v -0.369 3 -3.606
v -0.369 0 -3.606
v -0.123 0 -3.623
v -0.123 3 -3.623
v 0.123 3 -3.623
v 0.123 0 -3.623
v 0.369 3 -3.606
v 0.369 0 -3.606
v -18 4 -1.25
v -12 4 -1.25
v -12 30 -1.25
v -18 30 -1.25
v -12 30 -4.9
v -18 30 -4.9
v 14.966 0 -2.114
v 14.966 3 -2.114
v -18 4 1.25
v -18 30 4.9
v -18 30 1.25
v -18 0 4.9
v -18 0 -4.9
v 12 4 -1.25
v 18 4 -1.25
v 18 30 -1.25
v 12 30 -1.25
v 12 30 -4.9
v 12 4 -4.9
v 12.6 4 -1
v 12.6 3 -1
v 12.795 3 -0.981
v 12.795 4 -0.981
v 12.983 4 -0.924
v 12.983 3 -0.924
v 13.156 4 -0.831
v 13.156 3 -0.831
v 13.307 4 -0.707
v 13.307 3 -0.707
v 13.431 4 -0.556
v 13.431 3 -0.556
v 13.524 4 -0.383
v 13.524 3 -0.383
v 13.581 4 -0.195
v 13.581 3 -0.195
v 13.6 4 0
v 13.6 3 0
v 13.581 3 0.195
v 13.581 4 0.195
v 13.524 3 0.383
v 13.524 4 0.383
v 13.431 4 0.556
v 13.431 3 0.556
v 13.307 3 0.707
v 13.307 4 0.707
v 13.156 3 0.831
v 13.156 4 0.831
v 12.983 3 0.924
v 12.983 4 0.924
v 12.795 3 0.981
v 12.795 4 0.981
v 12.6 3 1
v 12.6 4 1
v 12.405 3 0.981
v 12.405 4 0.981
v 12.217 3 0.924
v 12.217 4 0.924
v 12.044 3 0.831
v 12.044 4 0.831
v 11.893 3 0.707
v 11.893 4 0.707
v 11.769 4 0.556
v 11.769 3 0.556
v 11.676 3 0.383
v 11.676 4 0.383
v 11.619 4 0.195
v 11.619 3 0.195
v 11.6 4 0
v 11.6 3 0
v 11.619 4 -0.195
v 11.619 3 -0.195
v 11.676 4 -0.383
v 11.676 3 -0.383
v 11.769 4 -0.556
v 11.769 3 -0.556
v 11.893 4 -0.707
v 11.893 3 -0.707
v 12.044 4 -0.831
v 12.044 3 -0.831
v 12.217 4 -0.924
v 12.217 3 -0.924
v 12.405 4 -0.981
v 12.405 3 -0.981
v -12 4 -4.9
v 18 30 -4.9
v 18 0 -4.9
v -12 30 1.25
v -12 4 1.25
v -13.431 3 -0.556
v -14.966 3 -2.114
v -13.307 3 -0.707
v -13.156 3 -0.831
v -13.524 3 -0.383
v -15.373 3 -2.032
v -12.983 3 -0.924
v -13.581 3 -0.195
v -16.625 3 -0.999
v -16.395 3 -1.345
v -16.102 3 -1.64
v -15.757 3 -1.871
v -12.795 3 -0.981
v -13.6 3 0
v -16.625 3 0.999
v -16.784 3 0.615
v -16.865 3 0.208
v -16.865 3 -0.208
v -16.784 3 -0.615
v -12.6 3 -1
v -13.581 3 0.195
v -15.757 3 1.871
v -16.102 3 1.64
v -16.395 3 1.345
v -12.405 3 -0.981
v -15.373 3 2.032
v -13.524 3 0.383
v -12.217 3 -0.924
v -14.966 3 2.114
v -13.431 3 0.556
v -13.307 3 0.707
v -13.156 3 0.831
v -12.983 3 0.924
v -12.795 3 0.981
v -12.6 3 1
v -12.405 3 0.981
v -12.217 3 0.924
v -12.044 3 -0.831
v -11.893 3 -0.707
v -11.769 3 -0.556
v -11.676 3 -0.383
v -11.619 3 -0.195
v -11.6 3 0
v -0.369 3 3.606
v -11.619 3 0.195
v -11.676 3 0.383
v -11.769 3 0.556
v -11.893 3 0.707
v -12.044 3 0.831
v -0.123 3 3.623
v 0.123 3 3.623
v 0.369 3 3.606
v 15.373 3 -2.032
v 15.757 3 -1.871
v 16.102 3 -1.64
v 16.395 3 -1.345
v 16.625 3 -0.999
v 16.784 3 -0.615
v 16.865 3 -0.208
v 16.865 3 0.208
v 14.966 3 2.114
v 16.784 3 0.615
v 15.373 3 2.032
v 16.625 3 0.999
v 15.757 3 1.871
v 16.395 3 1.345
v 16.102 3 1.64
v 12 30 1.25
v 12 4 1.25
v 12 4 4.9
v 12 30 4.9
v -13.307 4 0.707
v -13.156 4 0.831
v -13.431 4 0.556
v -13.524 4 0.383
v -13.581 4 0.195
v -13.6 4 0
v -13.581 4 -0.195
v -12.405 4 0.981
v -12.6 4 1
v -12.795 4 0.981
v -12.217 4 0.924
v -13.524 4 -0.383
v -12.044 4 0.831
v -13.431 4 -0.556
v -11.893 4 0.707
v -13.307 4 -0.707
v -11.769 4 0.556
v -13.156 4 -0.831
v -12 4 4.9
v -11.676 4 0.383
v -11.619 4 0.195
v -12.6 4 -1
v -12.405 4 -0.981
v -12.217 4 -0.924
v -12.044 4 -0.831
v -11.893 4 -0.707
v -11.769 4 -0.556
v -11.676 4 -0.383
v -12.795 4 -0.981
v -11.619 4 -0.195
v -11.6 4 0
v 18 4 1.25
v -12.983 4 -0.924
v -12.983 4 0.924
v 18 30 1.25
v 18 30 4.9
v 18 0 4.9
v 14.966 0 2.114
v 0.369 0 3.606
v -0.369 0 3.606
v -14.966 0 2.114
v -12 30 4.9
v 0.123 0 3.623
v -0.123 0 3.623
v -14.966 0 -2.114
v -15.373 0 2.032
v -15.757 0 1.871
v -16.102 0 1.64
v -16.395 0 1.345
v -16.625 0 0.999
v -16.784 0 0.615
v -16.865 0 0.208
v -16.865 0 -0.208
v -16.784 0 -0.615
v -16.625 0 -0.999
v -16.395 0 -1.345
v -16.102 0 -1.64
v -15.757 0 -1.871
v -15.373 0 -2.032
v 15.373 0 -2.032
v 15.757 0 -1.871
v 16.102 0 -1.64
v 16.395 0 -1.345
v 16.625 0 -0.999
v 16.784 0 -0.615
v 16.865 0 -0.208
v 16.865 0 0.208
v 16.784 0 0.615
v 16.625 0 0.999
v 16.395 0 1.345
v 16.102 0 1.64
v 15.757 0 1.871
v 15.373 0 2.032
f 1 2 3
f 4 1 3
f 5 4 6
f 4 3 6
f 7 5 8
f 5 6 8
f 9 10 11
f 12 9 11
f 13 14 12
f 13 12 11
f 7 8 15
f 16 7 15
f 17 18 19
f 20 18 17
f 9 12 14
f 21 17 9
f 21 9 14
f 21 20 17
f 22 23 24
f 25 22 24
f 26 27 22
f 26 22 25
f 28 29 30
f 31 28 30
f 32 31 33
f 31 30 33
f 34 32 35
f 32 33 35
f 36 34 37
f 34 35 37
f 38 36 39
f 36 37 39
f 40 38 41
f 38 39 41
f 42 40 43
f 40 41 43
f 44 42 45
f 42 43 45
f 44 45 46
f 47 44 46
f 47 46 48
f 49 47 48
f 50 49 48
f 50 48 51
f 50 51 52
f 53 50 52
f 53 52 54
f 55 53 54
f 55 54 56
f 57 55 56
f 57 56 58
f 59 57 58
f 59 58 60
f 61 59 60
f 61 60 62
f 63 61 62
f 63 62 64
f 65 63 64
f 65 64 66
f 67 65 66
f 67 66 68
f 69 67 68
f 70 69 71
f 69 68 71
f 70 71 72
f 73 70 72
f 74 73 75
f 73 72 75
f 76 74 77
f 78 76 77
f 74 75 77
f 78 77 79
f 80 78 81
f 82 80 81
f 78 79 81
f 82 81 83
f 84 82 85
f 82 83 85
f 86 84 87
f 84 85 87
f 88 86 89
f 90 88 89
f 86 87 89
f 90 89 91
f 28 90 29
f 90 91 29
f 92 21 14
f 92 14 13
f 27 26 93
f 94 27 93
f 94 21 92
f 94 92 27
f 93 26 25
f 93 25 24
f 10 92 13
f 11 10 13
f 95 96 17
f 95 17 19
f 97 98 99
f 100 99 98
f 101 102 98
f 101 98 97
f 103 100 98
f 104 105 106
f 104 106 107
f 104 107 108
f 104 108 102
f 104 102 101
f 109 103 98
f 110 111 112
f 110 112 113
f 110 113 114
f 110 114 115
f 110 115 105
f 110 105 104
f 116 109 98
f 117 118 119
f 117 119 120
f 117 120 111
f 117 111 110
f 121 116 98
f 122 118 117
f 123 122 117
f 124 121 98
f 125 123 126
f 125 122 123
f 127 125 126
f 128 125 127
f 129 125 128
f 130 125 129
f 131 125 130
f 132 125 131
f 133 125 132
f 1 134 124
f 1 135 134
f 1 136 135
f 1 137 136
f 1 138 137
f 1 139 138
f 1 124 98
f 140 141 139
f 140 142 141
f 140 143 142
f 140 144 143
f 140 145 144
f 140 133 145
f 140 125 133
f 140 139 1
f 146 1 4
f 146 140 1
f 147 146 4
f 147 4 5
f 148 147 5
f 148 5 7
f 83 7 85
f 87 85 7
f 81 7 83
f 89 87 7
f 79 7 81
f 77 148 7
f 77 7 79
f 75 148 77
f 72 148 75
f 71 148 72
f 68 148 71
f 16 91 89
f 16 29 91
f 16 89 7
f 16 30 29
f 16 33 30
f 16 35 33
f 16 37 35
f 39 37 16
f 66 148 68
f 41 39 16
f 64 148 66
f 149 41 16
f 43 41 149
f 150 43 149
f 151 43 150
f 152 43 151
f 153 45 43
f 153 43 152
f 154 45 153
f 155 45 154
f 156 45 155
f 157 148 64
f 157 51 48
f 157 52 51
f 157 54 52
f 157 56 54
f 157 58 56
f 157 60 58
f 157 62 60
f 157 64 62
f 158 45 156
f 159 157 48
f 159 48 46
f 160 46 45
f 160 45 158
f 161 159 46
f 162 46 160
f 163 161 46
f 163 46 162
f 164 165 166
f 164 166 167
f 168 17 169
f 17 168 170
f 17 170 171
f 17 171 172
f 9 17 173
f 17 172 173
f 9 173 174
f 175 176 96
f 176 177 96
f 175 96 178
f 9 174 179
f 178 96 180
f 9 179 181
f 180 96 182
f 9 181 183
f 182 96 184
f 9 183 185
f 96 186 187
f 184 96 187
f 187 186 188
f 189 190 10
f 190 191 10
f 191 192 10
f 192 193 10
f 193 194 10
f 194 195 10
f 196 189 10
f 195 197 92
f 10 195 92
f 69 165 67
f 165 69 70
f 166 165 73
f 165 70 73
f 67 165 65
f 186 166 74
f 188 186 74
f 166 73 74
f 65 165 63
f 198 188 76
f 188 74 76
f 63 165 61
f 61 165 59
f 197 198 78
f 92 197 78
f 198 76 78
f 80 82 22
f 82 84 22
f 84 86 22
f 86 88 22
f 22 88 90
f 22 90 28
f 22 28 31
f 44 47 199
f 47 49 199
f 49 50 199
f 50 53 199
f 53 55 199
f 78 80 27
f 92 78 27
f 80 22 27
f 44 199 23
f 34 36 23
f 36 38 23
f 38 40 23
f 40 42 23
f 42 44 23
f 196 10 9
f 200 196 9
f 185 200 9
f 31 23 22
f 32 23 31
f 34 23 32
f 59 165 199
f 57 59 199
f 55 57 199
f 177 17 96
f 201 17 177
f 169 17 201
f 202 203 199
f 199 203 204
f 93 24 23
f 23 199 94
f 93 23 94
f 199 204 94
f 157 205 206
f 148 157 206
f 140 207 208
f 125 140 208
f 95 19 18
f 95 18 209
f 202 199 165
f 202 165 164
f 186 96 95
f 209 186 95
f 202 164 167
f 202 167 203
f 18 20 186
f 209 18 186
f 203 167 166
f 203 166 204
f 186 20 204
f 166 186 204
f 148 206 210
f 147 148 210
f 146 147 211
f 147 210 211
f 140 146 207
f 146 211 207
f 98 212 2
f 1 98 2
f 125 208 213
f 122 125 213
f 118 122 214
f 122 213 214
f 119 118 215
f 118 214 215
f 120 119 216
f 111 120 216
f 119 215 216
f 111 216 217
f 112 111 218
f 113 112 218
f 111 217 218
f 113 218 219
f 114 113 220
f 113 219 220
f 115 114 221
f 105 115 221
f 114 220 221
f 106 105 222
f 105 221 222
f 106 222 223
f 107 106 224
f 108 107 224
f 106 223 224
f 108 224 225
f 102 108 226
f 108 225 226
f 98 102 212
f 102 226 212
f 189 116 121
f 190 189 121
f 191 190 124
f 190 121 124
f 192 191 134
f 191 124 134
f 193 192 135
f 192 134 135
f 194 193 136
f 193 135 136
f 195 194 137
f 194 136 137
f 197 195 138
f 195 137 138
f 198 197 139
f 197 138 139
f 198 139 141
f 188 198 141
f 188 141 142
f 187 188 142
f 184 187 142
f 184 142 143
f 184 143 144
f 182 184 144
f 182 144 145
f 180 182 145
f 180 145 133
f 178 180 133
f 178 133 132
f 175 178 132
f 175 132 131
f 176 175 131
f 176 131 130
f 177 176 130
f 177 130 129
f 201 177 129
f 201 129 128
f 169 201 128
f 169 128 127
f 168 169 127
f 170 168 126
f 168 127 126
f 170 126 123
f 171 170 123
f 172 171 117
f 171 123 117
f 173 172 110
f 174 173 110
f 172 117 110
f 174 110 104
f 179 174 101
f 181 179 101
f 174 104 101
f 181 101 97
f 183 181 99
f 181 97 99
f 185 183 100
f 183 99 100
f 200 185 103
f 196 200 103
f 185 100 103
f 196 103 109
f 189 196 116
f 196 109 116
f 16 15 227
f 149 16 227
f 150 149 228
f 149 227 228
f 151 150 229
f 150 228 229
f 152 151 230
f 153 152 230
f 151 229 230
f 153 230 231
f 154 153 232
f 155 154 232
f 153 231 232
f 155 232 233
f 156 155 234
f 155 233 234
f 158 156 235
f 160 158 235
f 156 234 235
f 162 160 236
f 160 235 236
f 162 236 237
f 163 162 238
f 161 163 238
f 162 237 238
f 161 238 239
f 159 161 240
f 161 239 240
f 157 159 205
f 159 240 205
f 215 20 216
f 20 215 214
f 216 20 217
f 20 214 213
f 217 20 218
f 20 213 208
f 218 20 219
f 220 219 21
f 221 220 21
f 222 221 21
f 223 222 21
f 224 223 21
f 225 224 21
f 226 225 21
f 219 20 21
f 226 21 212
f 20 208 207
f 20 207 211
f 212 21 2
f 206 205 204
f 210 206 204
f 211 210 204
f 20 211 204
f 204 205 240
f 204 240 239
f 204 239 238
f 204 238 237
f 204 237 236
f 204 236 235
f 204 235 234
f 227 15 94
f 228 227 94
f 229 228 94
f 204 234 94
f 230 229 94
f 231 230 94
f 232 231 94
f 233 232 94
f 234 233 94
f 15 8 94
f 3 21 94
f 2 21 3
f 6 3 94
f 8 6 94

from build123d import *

# Parameters (mm, degrees)
SKETCH_1_W          = 36
SKETCH_1_H          = 9.8
EXTRUDE_1_DEPTH     = 30
SKETCH_2_W          = 2.5
SKETCH_2_H          = 26
CUT_EXTRUDE_1_DEPTH = 48.116982077
SKETCH_3_W          = 24
SKETCH_3_H          = 26
CUT_EXTRUDE_2_DEPTH = 37.332354727
CUT_EXTRUDE_3_DEPTH = 3
CUT_EXTRUDE_4_REACH = 34.818
SKETCH_9_R          = 1


with BuildPart() as part:
    # 草图1 → 凸台-拉伸1 (new body)
    with BuildSketch(Plane(origin=(0, 0, 0), x_dir=(1, 0, 0), z_dir=(0, 1, 0))):
        Rectangle(SKETCH_1_W, SKETCH_1_H)
    extrude(amount=EXTRUDE_1_DEPTH)

    # 草图2 → 切除-拉伸1 (cut, through all)
    with BuildSketch(Plane(origin=(18, 0, 0), x_dir=(0, 0, -1), z_dir=(1, 0, 0))):
        with Locations((0, 17)):
            Rectangle(SKETCH_2_W, SKETCH_2_H)
    extrude(amount=-CUT_EXTRUDE_1_DEPTH, mode=Mode.SUBTRACT)

    # 草图3 → 切除-拉伸2 (cut, through all)
    with BuildSketch(Plane(origin=(0, 0, -4.9), x_dir=(-1, 0, 0), z_dir=(0, 0, -1))):
        with Locations((0, 17)):
            Rectangle(SKETCH_3_W, SKETCH_3_H)
    extrude(amount=-CUT_EXTRUDE_2_DEPTH, mode=Mode.SUBTRACT)

    # 草图5 → 切除-拉伸3 (cut)
    with BuildSketch(Plane.XZ):
        with BuildLine():
            Line((14.966101695, 2.113983221), (0.368644068, 3.606206671))
            ThreePointArc((0.368644068, 3.606206671), (0, 3.625), (-0.368644068, 3.606206671))
            Line((-0.368644068, 3.606206671), (-14.966101695, 2.113983221))
            ThreePointArc((-14.966101695, 2.113983221), (-16.875, 0), (-14.966101695, -2.113983221))
            Line((-14.966101695, -2.113983221), (-0.368644068, -3.606206671))
            ThreePointArc((-0.368644068, -3.606206671), (0, -3.625), (0.368644068, -3.606206671))
            Line((0.368644068, -3.606206671), (14.966101695, -2.113983221))
            ThreePointArc((14.966101695, -2.113983221), (16.875, 0), (14.966101695, 2.113983221))
        make_face()
    extrude(amount=-CUT_EXTRUDE_3_DEPTH, mode=Mode.SUBTRACT)

    # 草图9 → 切除-拉伸4 (cut, up to next)
    with BuildSketch(Plane.XZ.offset(-3), mode=Mode.PRIVATE) as cut_extrude_4_sk1:
        with Locations(Location((12.6, 0, 0), (0, 0, 270))):
            Circle(SKETCH_9_R)
    cut_extrude_4_tool1 = extrude(cut_extrude_4_sk1.sketch, amount=-CUT_EXTRUDE_4_REACH, mode=Mode.PRIVATE) & part.part
    # 草图9 → 切除-拉伸4 (cut, up to next)
    with BuildSketch(Plane.XZ.offset(-3), mode=Mode.PRIVATE) as cut_extrude_4_sk2:
        with Locations(Location((-12.6, 0, 0), (0, 0, 270))):
            Circle(SKETCH_9_R)
    cut_extrude_4_tool2 = extrude(cut_extrude_4_sk2.sketch, amount=-CUT_EXTRUDE_4_REACH, mode=Mode.PRIVATE) & part.part
    add(cut_extrude_4_tool1.solids().sort_by_distance((12.6, 3, 0))[0], mode=Mode.SUBTRACT)
    add(cut_extrude_4_tool2.solids().sort_by_distance((-12.6, 3, 0))[0], mode=Mode.SUBTRACT)


solid = part.part
